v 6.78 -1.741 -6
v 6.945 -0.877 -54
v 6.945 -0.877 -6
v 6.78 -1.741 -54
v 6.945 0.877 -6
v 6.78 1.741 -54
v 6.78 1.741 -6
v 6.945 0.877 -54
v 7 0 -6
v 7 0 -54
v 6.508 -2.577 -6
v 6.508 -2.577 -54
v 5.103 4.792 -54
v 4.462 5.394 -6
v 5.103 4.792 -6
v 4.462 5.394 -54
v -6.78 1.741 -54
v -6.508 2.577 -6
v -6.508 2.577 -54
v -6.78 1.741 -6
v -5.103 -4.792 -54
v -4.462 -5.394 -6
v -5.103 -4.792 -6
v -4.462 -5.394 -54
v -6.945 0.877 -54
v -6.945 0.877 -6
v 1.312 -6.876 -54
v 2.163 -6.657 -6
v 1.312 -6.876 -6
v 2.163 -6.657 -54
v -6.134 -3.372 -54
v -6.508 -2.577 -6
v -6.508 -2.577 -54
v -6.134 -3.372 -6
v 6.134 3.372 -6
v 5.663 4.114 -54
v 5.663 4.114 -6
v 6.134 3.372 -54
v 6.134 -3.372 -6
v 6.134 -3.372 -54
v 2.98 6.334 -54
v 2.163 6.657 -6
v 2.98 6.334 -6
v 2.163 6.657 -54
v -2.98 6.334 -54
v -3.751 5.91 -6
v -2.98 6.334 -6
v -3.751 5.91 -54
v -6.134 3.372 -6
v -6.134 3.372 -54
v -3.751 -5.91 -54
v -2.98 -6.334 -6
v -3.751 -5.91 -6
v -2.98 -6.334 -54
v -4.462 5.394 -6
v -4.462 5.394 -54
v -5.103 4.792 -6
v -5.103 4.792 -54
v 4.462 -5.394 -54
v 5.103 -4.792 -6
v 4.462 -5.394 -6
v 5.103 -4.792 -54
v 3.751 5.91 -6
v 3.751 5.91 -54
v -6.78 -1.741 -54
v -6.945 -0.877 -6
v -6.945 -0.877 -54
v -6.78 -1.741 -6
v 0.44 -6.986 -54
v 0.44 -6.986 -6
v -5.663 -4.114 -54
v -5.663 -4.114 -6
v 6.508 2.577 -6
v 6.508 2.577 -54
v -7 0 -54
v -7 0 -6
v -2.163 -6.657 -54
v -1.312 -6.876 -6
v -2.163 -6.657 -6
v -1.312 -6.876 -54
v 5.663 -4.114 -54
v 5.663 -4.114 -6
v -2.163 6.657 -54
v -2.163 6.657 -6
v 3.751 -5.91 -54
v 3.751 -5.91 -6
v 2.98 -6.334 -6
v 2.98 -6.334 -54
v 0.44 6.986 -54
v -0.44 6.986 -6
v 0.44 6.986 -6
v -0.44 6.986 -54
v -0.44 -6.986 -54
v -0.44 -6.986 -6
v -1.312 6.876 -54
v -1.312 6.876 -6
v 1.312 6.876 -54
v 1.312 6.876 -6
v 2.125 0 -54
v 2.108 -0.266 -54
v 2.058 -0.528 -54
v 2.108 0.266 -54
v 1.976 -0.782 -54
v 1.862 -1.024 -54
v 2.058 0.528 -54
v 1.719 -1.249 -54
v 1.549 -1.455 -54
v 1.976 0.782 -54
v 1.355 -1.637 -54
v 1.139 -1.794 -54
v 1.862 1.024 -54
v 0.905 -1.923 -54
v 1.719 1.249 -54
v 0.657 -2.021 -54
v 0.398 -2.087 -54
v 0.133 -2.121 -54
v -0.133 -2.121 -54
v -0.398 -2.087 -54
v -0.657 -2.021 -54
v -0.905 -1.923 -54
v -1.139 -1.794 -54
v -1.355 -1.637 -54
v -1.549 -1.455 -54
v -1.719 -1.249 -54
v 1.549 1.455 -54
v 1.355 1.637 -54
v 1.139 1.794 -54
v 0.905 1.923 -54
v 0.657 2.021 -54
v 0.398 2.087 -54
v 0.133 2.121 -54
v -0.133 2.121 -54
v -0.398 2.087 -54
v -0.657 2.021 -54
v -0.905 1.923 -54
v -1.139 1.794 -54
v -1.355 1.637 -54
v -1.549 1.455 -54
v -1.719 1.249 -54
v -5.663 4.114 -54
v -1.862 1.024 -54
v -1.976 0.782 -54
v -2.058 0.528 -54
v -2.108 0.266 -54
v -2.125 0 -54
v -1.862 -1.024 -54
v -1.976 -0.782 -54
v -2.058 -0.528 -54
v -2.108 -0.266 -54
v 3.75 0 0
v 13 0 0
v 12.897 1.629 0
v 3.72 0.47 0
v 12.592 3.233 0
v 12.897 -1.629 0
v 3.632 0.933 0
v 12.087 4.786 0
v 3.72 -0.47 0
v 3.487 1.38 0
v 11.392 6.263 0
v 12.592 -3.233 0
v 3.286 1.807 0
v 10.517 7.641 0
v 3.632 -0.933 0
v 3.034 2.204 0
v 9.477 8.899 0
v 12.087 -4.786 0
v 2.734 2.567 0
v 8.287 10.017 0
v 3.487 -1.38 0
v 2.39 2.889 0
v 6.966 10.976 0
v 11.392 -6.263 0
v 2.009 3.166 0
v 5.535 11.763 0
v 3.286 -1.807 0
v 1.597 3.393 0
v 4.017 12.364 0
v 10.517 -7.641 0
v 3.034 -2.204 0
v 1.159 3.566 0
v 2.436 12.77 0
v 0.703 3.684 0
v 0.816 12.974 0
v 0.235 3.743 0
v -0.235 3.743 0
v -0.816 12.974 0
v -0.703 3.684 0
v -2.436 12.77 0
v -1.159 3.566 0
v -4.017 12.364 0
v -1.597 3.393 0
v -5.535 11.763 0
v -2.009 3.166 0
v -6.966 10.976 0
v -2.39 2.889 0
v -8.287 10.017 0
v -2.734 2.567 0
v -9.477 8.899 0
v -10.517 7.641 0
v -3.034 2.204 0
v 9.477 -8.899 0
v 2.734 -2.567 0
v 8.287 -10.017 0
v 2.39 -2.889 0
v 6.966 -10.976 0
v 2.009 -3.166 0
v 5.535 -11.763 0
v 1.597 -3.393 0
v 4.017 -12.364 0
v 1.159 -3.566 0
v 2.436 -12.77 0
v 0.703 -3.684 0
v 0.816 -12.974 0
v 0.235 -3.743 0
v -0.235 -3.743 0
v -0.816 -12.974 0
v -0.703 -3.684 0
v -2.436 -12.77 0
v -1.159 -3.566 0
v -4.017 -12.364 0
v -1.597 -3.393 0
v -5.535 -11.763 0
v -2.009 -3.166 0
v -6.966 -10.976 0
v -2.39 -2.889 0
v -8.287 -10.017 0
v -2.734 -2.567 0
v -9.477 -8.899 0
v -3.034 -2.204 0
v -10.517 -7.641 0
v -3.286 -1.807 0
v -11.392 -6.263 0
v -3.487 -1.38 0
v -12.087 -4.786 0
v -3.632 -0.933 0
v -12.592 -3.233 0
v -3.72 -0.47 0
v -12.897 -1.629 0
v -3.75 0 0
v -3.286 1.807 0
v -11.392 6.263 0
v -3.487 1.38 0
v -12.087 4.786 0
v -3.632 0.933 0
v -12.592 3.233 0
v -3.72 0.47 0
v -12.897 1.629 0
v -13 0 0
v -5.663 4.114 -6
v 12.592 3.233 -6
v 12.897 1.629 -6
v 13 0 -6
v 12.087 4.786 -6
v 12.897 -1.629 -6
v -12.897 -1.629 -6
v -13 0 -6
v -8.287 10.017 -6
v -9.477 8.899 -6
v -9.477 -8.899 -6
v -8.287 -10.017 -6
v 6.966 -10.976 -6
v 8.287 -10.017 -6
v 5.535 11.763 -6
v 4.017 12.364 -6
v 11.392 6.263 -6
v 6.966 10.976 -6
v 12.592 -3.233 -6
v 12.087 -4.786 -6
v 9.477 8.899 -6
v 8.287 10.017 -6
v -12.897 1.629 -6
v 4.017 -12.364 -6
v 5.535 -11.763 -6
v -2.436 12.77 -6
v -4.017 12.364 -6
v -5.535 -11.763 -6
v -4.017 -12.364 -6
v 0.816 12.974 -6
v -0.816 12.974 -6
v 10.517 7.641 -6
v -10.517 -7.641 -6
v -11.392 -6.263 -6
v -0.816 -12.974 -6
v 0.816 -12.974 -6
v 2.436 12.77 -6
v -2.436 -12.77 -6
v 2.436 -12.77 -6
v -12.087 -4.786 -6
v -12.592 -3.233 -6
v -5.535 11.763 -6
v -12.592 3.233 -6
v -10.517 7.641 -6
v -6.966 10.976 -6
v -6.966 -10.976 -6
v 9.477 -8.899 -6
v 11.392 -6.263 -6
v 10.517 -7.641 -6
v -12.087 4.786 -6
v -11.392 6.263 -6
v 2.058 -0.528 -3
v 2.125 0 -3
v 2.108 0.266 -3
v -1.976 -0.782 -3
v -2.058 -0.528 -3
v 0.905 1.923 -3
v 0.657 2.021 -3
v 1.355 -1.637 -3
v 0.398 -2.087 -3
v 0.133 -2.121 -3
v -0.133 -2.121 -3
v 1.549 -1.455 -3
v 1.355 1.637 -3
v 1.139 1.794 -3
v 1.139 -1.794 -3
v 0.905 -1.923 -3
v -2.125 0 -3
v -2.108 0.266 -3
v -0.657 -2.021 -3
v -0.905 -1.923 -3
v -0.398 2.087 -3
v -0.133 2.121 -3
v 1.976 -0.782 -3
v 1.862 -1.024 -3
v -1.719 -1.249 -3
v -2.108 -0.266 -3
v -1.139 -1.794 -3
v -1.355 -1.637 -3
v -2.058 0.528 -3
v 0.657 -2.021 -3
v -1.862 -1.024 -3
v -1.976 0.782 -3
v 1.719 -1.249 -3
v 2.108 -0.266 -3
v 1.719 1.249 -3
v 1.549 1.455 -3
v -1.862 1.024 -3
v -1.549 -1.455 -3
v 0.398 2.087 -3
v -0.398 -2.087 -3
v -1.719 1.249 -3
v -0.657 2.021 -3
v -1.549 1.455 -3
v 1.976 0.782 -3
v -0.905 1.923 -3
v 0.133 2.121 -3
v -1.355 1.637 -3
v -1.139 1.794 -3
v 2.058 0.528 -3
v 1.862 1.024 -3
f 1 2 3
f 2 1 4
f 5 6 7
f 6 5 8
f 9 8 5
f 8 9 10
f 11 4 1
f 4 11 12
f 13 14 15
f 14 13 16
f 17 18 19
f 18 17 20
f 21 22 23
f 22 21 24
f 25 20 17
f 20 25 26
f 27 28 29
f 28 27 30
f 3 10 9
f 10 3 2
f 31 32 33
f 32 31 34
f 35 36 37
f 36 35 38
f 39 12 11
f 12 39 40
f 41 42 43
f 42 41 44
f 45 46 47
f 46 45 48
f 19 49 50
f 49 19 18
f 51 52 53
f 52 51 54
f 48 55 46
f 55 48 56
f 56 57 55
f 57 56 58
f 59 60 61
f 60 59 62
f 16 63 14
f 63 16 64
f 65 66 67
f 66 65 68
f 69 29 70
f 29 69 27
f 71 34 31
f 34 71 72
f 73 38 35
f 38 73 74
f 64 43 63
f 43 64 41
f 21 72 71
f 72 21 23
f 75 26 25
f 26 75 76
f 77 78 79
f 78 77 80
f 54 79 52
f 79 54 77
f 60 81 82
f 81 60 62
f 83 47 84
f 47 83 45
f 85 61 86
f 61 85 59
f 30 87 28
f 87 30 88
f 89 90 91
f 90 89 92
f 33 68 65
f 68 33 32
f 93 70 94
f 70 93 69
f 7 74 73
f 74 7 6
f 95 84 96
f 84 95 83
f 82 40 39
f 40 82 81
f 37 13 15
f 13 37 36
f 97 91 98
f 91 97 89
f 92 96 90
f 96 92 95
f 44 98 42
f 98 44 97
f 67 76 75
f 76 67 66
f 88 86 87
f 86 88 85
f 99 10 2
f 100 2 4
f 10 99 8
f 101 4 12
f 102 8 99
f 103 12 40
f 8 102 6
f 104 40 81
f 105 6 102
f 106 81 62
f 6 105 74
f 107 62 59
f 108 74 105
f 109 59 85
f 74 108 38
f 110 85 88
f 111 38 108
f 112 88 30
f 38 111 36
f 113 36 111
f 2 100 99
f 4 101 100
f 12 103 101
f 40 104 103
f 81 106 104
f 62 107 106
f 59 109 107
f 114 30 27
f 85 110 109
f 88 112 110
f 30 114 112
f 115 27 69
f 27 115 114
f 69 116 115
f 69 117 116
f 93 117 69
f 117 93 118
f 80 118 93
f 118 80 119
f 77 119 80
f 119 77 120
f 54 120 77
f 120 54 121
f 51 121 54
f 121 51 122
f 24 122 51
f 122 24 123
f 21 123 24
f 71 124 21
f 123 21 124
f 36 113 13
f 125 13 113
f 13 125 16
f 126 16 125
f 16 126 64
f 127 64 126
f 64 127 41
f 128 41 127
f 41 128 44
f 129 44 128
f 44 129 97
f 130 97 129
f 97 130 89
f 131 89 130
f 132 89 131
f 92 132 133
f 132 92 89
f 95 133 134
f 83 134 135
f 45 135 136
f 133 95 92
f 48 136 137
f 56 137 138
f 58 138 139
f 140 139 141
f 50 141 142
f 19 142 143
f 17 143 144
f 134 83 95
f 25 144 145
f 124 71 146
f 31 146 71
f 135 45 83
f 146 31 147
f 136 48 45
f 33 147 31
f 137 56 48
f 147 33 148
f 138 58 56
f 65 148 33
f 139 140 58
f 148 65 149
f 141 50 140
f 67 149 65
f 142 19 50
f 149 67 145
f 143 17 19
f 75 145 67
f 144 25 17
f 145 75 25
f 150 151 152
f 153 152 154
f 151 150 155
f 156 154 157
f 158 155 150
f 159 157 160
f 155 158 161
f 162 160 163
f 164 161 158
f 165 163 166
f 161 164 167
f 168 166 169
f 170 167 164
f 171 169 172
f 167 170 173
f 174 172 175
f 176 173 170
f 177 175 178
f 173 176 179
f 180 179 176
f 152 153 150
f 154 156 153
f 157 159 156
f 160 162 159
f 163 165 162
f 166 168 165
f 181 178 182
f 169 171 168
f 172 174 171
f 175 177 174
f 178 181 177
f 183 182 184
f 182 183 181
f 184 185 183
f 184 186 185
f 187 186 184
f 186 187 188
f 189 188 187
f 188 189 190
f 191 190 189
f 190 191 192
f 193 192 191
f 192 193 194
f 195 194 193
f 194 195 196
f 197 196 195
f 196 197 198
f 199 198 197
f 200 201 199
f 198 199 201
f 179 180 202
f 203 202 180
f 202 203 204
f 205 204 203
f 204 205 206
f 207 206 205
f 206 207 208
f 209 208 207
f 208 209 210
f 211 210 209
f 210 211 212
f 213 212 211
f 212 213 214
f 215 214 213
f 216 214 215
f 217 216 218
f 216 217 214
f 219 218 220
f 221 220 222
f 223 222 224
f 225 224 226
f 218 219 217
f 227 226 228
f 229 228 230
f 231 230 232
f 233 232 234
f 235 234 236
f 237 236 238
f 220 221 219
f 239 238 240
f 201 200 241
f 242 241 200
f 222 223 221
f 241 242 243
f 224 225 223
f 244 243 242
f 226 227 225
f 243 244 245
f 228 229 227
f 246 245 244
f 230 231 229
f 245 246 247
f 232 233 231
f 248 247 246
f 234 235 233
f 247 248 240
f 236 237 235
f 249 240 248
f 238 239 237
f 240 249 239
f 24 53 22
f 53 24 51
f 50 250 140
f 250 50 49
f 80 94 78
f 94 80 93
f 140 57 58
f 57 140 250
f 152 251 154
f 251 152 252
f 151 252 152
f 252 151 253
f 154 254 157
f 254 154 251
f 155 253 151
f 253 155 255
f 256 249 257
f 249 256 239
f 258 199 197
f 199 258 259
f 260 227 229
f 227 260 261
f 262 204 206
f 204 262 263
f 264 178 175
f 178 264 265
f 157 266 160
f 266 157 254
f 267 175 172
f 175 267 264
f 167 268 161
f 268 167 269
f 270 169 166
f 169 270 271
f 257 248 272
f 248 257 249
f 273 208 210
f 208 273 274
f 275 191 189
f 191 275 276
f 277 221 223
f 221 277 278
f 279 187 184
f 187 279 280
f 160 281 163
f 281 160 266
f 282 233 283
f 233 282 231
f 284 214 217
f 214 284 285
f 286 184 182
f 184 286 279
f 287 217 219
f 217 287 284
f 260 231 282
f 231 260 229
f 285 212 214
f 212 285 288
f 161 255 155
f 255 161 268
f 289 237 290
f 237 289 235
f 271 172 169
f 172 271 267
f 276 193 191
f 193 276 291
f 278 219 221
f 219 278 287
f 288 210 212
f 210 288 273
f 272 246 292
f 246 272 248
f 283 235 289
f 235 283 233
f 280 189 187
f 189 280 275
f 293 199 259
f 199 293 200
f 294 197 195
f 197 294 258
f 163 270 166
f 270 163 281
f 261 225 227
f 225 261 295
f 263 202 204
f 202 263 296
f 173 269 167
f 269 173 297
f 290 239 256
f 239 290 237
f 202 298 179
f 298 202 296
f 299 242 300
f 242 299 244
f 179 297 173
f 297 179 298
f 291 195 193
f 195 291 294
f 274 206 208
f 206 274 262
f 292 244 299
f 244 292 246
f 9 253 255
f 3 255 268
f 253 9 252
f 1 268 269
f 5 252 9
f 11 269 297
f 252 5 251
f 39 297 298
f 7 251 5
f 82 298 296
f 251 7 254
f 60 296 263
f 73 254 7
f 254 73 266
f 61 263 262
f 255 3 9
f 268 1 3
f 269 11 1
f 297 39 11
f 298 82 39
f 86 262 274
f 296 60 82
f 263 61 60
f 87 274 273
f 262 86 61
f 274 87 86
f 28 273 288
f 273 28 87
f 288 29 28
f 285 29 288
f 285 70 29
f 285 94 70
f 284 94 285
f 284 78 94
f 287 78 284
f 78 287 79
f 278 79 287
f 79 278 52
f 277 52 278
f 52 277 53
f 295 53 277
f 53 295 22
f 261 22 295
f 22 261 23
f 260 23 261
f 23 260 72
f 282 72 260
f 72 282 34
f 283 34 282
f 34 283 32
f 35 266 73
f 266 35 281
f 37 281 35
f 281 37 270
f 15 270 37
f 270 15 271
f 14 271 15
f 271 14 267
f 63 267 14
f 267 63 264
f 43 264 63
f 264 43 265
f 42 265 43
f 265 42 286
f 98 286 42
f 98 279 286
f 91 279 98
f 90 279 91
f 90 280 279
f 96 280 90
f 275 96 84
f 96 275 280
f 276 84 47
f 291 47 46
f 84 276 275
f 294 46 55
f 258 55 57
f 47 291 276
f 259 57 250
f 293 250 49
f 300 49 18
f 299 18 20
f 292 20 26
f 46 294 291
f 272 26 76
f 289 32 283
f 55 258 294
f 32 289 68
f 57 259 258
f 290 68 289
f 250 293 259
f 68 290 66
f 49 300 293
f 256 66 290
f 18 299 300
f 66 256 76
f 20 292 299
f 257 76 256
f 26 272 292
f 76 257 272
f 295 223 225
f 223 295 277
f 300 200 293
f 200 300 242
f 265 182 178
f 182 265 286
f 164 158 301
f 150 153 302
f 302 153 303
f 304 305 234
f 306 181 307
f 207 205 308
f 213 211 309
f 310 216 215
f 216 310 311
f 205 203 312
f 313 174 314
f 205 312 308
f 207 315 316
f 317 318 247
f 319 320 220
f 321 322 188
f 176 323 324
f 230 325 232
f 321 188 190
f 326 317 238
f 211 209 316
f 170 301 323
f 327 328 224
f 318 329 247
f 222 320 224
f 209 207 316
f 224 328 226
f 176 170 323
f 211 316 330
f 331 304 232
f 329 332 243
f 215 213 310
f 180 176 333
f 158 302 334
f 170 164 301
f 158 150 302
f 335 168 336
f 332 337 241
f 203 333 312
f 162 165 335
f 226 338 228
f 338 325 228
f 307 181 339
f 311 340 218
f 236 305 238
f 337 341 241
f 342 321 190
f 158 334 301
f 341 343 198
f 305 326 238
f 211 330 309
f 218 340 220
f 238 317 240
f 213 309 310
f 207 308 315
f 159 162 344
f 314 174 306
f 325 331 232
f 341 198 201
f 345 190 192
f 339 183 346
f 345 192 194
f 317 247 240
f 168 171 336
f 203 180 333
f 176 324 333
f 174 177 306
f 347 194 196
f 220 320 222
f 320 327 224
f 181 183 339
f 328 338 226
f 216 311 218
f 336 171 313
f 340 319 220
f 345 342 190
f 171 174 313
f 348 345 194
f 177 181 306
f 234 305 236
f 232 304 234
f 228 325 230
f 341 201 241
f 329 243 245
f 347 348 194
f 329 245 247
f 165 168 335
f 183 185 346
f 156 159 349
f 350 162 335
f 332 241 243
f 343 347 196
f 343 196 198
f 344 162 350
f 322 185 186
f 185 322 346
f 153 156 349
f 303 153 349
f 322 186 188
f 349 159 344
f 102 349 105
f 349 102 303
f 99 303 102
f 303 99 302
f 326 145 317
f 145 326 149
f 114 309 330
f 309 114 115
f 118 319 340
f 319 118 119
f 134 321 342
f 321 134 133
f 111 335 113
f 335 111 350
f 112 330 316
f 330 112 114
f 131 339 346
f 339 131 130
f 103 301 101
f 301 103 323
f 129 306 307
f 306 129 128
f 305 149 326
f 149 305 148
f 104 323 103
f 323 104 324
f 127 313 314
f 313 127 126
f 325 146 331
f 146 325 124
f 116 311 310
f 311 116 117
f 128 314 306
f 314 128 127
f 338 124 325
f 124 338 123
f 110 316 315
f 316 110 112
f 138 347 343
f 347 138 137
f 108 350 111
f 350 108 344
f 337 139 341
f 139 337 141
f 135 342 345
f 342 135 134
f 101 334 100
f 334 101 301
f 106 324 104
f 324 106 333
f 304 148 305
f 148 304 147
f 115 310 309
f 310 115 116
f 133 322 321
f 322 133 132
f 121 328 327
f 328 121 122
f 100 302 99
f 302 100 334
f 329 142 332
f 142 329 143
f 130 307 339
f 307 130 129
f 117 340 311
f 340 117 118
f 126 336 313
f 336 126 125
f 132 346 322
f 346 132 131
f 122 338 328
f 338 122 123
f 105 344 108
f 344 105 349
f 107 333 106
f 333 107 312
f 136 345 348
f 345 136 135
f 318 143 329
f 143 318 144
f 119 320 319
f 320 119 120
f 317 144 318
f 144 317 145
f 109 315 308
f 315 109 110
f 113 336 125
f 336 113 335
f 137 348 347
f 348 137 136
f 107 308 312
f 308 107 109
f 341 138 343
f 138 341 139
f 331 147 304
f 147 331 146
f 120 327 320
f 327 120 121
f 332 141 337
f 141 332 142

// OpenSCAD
$fn = 50;


difference() {
	union() {
		translate(v = [0, 0, -54.0000000000]) {
			cylinder(h = 54, r = 7.0000000000);
		}
		translate(v = [0, 0, -6.0000000000]) {
			cylinder(h = 6, r = 13.0000000000);
		}
	}
	union() {
		translate(v = [0, 0, 0]) {
			rotate(a = [0, 0, 0]) {
				difference() {
					union() {
						#translate(v = [0, 0, -54.0000000000]) {
							cylinder(h = 54, r = 2.0000000000);
						}
						#translate(v = [0, 0, -3]) {
							cylinder(h = 3, r = 7.0000000000, r1 = 2.1250000000, r2 = 3.7500000000);
						}
						#translate(v = [0, 0, -54.0000000000]) {
							cylinder(h = 54, r = 2.1250000000);
						}
						#translate(v = [0, 0, -54.0000000000]) {
							cylinder(h = 54, r = 2.0000000000);
						}
					}
					union();
				}
			}
		}
	}
}
